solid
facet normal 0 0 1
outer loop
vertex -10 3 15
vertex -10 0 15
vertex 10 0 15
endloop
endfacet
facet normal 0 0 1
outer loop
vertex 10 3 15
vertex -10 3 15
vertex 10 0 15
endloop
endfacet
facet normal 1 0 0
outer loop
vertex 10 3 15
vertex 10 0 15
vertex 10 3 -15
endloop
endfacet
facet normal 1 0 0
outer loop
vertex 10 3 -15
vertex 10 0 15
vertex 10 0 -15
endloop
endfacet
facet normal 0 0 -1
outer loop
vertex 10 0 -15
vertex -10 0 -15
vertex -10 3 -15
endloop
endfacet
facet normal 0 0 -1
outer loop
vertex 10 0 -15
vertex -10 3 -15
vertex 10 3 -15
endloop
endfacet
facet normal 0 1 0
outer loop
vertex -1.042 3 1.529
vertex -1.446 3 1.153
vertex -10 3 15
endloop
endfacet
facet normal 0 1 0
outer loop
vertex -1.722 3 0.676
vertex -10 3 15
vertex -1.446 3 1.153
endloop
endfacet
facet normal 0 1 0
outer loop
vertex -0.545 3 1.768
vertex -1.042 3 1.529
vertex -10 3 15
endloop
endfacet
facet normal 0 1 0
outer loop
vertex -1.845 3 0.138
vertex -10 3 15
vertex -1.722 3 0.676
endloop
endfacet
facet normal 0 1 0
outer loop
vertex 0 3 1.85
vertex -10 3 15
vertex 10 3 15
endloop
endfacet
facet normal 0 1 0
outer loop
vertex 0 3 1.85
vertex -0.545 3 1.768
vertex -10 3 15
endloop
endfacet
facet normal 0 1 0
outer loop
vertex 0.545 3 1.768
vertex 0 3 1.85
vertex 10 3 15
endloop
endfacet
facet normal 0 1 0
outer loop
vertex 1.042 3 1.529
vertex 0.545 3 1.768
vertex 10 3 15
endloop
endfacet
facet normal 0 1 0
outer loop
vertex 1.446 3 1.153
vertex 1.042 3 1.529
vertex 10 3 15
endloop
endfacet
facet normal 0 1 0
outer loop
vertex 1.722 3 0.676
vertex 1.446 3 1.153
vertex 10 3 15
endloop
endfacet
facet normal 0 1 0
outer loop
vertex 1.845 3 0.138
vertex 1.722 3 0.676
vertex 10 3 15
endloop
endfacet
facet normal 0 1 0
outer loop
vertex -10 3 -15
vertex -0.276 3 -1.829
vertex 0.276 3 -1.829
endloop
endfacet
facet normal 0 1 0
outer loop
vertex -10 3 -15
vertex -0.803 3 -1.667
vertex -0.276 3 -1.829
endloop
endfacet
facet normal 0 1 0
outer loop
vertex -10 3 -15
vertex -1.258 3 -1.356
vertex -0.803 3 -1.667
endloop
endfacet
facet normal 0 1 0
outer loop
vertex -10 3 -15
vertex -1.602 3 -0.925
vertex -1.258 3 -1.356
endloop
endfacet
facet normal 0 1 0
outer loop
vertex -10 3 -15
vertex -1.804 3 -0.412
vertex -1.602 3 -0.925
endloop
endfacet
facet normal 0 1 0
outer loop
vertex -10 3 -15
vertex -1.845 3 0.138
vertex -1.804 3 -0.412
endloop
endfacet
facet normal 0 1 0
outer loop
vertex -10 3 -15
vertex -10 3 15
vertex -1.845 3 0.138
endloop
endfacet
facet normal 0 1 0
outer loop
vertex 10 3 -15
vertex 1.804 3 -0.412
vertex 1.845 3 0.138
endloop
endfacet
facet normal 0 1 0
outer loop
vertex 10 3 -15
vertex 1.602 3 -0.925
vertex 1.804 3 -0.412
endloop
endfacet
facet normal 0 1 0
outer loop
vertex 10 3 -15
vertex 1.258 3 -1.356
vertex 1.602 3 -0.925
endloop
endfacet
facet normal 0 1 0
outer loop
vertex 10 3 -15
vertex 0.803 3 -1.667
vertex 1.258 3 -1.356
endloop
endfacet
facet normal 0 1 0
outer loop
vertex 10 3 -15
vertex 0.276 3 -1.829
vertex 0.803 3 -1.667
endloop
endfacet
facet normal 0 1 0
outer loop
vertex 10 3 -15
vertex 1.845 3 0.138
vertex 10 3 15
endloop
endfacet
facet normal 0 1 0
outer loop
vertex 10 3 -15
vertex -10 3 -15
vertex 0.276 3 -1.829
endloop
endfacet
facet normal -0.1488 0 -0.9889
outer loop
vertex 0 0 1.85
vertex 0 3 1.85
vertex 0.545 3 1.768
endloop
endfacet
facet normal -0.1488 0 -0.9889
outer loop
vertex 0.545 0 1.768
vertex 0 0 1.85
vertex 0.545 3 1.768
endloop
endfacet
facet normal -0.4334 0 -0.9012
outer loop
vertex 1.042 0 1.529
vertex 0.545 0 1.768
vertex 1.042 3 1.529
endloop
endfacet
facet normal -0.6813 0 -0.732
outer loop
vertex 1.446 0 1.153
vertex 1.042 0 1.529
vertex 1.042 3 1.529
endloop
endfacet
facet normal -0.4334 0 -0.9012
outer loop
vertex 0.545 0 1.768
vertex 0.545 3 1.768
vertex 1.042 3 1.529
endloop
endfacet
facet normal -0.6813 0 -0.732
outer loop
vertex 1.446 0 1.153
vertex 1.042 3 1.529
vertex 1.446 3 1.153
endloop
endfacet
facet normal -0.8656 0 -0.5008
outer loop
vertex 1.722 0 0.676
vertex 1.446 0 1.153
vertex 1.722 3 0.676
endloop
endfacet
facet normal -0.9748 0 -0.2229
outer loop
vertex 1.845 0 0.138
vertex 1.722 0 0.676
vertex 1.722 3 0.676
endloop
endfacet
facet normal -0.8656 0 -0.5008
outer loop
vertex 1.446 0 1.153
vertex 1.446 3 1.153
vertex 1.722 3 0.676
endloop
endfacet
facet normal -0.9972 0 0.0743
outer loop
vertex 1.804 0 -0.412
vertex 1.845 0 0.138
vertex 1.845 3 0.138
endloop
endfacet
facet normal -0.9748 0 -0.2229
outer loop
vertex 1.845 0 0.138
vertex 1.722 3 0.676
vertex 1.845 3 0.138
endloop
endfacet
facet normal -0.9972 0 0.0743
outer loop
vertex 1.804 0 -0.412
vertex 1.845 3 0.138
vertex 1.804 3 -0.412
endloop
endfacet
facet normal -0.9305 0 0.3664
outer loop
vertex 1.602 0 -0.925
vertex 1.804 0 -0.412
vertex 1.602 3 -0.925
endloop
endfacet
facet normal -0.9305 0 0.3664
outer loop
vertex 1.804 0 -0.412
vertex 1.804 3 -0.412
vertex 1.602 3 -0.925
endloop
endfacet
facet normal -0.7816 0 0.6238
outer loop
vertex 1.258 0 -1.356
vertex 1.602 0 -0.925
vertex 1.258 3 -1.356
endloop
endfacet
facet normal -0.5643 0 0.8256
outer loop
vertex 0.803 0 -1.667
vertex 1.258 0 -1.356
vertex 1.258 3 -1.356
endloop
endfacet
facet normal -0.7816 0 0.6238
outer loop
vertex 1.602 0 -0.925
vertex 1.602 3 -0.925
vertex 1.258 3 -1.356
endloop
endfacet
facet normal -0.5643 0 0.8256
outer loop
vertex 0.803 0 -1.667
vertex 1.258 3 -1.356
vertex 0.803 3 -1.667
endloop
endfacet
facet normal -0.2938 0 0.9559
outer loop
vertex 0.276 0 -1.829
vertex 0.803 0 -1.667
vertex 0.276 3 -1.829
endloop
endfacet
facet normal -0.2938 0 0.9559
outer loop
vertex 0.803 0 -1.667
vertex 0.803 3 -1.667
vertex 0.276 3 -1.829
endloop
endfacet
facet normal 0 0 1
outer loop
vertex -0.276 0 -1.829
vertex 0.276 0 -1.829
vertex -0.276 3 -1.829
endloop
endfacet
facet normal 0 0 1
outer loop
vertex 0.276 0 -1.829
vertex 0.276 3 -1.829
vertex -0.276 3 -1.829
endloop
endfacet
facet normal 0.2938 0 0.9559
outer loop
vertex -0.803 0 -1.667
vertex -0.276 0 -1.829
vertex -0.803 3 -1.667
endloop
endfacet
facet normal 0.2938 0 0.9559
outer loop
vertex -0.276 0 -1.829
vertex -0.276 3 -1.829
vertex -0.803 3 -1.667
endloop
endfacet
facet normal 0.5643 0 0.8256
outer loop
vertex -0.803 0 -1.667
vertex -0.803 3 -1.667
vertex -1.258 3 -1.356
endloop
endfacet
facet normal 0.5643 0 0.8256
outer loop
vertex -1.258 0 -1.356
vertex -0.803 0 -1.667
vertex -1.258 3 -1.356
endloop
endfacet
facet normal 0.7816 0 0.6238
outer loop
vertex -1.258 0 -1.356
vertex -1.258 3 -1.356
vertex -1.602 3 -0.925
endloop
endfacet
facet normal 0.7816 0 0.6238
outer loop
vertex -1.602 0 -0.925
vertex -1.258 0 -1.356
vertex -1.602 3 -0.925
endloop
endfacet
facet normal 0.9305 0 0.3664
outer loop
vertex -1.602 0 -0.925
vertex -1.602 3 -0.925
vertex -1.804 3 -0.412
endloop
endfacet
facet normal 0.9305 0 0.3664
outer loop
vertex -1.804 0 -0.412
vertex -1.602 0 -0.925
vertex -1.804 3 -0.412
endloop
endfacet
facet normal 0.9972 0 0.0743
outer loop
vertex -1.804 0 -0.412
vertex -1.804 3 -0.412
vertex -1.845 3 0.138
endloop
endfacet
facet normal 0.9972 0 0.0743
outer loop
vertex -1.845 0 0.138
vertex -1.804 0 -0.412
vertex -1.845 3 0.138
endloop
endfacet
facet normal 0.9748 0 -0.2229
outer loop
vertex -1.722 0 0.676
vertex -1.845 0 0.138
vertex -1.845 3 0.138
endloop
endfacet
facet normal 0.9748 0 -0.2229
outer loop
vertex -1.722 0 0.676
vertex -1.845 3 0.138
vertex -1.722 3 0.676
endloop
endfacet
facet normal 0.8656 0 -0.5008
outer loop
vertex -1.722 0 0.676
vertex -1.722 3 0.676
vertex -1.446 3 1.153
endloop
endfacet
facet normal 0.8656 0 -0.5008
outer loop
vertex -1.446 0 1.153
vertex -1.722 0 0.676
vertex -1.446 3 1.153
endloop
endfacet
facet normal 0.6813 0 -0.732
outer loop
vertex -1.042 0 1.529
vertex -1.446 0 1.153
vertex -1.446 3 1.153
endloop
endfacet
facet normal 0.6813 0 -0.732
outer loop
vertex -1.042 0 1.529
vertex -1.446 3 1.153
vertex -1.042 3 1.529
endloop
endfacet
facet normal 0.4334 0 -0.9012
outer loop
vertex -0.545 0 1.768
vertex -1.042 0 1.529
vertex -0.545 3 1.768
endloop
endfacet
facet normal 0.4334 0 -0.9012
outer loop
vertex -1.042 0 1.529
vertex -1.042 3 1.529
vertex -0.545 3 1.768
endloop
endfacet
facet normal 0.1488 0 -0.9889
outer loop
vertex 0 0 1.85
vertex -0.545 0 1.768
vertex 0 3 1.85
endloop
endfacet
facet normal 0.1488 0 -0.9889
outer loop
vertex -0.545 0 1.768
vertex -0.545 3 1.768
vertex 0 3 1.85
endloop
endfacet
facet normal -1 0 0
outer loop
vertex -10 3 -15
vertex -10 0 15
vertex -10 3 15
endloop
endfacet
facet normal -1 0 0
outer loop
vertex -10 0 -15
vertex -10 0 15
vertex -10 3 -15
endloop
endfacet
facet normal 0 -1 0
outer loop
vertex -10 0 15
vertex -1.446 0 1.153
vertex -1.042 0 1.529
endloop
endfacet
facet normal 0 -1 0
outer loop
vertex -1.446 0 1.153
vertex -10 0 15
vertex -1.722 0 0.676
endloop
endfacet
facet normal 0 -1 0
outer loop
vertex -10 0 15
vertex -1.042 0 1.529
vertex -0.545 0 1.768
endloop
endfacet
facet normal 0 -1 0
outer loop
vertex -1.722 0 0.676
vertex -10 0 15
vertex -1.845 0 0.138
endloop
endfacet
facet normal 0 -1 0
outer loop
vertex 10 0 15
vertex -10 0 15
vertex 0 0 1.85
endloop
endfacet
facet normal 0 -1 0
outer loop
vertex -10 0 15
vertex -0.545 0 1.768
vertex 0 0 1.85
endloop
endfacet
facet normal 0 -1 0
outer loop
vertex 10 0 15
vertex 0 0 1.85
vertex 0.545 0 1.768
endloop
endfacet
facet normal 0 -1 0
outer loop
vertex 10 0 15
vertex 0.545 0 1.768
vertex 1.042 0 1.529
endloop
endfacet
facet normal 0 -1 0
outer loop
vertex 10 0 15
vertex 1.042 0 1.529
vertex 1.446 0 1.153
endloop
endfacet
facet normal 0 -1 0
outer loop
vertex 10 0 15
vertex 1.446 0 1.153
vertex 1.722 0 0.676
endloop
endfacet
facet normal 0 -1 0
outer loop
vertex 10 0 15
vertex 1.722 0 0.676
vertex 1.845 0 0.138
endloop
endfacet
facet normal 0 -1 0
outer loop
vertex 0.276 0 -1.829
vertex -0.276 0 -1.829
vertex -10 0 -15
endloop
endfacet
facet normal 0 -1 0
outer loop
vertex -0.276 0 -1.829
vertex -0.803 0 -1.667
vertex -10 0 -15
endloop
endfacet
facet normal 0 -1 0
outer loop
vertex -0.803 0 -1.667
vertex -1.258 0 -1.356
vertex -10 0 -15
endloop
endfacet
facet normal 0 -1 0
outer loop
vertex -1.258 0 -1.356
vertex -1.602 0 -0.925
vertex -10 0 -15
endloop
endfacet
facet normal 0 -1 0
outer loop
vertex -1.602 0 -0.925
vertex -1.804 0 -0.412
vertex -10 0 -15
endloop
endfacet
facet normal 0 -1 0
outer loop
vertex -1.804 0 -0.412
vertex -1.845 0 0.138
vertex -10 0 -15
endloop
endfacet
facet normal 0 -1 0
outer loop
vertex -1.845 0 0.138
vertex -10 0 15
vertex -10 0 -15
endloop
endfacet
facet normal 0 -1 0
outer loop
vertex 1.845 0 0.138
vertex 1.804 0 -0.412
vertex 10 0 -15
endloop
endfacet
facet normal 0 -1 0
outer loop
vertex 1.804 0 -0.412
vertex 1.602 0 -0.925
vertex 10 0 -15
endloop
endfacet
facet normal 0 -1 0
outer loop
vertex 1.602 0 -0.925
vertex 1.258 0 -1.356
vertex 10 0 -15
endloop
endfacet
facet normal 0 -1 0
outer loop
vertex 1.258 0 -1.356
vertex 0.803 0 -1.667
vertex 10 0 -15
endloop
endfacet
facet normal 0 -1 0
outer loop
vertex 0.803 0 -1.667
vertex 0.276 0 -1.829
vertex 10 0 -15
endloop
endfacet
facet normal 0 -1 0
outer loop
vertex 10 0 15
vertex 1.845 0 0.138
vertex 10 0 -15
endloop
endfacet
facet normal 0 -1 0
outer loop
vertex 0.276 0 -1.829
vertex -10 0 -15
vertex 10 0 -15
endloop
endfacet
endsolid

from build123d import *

# Parameters (mm, degrees)
SKETCH_1_W          = 20
SKETCH_1_H          = 30
EXTRUDE_1_DEPTH     = 3
SKETCH_2_R          = 1.85
CUT_EXTRUDE_1_DEPTH = 3


with BuildPart() as part:
    # 草图1 → 凸台-拉伸1 (new body)
    with BuildSketch(Plane(origin=(0, 0, 0), x_dir=(1, 0, 0), z_dir=(0, 1, 0))):
        Rectangle(SKETCH_1_W, SKETCH_1_H)
    extrude(amount=EXTRUDE_1_DEPTH)

    # 草图2 → 切除-拉伸1 (cut)
    with BuildSketch(Plane(origin=(0, 3, 0), x_dir=(1, 0, 0), z_dir=(0, 1, 0))):
        with Locations(Location((0, 0, 0), (0, 0, 270))):
            Circle(SKETCH_2_R)
    extrude(amount=-CUT_EXTRUDE_1_DEPTH, mode=Mode.SUBTRACT)


solid = part.part
